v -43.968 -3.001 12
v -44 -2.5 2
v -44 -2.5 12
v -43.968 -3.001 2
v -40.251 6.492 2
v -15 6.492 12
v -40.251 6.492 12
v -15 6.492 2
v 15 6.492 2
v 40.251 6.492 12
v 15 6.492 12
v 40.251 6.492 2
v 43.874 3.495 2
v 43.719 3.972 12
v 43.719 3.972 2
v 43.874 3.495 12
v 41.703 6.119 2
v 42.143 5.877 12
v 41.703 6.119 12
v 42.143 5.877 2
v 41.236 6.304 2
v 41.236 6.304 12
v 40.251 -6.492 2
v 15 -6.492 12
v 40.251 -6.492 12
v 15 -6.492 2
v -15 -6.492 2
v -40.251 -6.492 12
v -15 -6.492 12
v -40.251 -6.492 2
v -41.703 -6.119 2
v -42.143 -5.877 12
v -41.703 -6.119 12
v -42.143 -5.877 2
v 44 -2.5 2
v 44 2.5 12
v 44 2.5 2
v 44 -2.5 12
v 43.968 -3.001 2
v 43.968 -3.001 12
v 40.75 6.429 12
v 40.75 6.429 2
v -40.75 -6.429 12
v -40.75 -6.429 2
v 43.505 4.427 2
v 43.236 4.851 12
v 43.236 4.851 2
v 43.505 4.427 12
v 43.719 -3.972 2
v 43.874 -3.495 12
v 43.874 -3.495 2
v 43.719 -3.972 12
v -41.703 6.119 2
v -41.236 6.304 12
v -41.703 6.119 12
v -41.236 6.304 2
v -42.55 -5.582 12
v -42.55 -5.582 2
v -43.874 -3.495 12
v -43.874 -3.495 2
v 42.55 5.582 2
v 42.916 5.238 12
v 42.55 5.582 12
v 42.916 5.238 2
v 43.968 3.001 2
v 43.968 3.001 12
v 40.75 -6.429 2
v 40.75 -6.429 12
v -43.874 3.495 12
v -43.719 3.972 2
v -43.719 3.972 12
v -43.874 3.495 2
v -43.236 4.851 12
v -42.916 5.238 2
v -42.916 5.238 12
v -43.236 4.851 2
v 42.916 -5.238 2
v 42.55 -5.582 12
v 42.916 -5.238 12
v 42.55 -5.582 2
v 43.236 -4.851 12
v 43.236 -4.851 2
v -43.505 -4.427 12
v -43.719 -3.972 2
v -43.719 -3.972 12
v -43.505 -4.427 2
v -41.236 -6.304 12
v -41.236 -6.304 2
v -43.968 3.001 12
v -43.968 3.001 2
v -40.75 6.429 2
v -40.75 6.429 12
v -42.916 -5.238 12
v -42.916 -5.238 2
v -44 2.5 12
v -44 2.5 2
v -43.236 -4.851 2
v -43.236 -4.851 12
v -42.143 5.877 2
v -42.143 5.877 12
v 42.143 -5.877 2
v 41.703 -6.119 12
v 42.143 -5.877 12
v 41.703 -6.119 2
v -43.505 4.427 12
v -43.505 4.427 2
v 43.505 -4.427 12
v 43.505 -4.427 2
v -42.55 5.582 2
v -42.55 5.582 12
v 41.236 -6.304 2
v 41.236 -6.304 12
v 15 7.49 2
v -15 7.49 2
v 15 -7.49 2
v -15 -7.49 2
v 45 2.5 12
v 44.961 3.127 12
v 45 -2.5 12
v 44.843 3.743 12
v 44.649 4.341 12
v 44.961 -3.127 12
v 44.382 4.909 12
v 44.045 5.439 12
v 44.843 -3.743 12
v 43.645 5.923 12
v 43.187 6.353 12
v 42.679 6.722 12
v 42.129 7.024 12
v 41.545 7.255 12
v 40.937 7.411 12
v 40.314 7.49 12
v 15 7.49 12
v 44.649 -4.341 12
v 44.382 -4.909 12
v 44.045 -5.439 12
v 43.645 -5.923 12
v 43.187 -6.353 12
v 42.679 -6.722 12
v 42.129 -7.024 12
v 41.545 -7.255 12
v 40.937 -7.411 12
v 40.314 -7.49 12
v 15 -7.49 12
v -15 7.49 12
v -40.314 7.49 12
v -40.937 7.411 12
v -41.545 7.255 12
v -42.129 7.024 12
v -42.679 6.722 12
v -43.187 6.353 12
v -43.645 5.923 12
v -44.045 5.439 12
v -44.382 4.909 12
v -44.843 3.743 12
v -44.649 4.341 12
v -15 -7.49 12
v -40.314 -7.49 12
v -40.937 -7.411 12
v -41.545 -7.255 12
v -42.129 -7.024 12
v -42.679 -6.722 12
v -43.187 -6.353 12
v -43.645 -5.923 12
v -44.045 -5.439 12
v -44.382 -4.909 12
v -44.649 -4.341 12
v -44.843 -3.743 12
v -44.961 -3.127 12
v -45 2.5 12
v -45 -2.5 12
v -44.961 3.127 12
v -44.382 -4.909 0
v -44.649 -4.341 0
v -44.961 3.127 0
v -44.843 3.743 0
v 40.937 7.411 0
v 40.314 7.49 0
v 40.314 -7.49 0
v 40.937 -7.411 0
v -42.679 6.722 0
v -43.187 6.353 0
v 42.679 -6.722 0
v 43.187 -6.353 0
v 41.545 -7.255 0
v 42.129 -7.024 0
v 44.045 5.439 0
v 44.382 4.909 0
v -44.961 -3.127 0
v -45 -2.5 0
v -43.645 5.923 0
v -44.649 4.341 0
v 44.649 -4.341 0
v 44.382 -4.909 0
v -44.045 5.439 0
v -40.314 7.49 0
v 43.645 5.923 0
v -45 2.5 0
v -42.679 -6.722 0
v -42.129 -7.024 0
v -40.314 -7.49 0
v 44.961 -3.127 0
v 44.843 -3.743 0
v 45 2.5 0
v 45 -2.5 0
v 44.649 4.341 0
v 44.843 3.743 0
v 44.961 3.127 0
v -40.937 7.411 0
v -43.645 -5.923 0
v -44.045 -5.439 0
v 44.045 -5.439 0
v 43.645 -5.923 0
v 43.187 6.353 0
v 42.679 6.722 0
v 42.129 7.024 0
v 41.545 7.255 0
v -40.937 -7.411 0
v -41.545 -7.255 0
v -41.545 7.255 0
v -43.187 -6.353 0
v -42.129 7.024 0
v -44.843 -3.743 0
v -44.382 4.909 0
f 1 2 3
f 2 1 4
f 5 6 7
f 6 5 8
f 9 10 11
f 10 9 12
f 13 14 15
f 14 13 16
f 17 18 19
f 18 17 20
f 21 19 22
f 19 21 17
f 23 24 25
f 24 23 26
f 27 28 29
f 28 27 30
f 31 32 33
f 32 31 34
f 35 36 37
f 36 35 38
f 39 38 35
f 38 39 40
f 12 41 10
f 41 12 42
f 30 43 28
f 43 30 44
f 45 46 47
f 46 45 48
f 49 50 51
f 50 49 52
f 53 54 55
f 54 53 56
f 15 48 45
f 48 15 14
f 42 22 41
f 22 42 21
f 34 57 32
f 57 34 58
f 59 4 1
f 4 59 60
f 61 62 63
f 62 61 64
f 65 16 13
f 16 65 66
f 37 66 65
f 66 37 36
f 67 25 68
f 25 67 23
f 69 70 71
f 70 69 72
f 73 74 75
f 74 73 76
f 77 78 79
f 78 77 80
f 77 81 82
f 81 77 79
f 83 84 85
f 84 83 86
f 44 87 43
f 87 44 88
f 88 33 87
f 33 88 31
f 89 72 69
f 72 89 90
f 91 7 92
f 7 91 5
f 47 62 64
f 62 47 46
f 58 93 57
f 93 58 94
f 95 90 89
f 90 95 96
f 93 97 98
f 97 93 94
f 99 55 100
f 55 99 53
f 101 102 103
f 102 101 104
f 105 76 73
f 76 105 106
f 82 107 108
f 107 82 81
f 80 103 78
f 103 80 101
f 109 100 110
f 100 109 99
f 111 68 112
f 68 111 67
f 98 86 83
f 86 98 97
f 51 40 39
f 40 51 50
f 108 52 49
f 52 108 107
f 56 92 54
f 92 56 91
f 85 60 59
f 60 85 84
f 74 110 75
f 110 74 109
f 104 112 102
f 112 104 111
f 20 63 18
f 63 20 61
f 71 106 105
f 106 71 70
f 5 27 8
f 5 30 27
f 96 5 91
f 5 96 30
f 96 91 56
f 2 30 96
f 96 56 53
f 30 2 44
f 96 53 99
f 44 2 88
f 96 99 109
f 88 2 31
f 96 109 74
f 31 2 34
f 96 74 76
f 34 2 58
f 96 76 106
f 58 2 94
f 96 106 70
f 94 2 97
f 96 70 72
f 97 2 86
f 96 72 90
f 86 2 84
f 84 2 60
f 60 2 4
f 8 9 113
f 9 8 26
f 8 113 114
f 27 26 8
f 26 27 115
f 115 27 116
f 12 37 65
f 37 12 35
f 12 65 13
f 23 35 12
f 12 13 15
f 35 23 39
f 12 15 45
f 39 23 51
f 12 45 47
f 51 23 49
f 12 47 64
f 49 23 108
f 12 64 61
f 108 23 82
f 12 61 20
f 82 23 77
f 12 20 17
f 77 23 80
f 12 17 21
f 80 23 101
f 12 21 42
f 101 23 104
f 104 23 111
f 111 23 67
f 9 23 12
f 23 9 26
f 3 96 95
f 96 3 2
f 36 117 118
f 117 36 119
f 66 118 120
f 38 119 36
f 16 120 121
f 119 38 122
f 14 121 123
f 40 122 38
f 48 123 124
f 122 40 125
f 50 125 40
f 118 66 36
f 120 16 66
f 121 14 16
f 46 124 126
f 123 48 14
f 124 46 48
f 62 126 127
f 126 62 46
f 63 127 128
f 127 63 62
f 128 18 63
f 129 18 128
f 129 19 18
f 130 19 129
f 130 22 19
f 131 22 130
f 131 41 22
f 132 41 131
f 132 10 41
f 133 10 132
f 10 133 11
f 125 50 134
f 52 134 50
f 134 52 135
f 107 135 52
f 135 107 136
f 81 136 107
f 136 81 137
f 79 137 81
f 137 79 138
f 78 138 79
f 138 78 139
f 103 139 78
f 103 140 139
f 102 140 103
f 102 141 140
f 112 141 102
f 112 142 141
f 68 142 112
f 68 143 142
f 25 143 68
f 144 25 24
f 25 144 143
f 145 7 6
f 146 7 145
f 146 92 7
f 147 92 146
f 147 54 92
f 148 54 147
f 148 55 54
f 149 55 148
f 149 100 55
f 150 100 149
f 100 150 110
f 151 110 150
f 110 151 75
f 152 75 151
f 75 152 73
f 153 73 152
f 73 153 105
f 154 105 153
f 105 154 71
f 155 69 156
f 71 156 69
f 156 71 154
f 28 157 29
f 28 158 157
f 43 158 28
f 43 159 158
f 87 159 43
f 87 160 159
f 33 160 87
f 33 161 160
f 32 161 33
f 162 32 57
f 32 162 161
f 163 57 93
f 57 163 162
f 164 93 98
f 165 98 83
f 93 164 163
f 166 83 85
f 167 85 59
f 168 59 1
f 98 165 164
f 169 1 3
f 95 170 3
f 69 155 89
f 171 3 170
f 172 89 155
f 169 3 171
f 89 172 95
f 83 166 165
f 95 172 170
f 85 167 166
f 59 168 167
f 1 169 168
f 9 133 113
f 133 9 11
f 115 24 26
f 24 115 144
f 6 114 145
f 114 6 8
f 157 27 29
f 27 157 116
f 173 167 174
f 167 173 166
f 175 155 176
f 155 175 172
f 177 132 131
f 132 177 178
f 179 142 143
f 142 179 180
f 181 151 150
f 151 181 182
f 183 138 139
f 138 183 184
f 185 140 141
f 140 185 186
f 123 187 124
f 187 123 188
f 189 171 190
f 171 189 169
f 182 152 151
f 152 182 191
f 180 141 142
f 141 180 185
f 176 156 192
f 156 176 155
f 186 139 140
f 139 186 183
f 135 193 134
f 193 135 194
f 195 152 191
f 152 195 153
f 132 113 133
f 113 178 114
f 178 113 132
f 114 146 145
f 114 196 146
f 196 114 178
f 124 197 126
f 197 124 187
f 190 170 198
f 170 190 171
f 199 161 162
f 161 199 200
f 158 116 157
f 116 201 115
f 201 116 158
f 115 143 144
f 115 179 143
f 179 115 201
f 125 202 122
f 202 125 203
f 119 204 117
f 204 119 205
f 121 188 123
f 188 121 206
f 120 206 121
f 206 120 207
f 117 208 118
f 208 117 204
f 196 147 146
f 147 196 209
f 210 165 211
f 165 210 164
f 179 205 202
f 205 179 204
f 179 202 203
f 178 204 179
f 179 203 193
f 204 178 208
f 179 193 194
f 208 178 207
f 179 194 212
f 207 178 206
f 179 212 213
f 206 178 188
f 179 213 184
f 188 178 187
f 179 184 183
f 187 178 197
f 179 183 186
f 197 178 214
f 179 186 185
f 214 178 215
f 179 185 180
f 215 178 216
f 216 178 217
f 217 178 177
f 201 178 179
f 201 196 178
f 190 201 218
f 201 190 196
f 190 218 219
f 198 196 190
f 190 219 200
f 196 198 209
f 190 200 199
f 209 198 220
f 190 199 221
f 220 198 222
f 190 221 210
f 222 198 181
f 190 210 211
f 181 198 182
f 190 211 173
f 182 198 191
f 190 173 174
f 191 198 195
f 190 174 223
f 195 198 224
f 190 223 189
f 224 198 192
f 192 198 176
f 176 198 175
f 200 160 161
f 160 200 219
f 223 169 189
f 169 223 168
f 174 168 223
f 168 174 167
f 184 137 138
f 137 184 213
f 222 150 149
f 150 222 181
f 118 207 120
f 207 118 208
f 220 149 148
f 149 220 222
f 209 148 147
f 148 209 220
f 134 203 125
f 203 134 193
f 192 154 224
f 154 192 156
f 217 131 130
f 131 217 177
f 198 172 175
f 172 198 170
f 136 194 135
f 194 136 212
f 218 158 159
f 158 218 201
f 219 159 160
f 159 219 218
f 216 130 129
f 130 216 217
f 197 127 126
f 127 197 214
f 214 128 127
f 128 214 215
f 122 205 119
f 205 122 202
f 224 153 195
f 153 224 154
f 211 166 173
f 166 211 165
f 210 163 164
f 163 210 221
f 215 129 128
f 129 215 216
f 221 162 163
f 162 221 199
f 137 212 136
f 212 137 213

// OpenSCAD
$fn = 50;


difference() {
	union() {
		hull() {
			translate(v = [-40.0000000000, 2.5000000000, 0]) {
				cylinder(h = 12, r = 5);
			}
			translate(v = [40.0000000000, 2.5000000000, 0]) {
				cylinder(h = 12, r = 5);
			}
			translate(v = [-40.0000000000, -2.5000000000, 0]) {
				cylinder(h = 12, r = 5);
			}
			translate(v = [40.0000000000, -2.5000000000, 0]) {
				cylinder(h = 12, r = 5);
			}
		}
	}
	union() {
		translate(v = [0, 0, 2]) {
			hull() {
				translate(v = [-40.0000000000, 2.5000000000, 0]) {
					cylinder(h = 10, r = 4);
				}
				translate(v = [40.0000000000, 2.5000000000, 0]) {
					cylinder(h = 10, r = 4);
				}
				translate(v = [-40.0000000000, -2.5000000000, 0]) {
					cylinder(h = 10, r = 4);
				}
				translate(v = [40.0000000000, -2.5000000000, 0]) {
					cylinder(h = 10, r = 4);
				}
			}
		}
		#translate(v = [-15.0000000000, -15.0000000000, 2]) {
			cube(size = [30, 30, 10]);
		}
	}
}
